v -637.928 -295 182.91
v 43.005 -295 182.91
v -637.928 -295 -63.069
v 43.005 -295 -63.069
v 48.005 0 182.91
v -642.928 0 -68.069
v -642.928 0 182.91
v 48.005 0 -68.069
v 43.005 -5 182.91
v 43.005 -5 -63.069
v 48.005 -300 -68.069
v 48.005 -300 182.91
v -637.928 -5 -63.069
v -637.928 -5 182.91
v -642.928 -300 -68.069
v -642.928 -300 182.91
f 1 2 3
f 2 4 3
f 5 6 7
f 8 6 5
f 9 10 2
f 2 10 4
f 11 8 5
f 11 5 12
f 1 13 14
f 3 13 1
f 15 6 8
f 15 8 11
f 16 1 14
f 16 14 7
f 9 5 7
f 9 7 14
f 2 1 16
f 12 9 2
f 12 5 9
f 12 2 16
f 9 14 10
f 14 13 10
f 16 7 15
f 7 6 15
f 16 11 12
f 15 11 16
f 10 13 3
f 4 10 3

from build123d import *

# Parameters (mm, degrees)
F0_W     = 90.9334234893
F0_H     = 50.9791802615
F1_DEPTH = 300
F2_DEPTH = 600
F3_DEPTH = 200
F4_T     = -5


with BuildPart() as f1:
    # F0 (on Front) → F1 (new body)
    with BuildSketch(Plane.XZ):
        with Locations((2.5382172316, -42.5791377202)):
            Rectangle(F0_W, F0_H)
    extrude(amount=F1_DEPTH)

    # F2 (add): a face of the model
    f2_faces = [f1.faces().sort_by_distance(p)[0] for p in [
        (-42.928494513, -150, -42.5791377202),
    ]]
    extrude(f2_faces, amount=F2_DEPTH)

    # F3 (add): a face of the model
    f3_faces = [f1.faces().sort_by_distance(p)[0] for p in [
        (-297.4617827684, -150, -17.0895475894),
    ]]
    extrude(f3_faces, amount=F3_DEPTH)

    # F4
    f4_openings = [f1.faces().sort_by_distance(p)[0] for p in [
        (-297.461783, -150, 182.910452),
    ]]
    offset(amount=F4_T, openings=f4_openings)


solid = f1.part
